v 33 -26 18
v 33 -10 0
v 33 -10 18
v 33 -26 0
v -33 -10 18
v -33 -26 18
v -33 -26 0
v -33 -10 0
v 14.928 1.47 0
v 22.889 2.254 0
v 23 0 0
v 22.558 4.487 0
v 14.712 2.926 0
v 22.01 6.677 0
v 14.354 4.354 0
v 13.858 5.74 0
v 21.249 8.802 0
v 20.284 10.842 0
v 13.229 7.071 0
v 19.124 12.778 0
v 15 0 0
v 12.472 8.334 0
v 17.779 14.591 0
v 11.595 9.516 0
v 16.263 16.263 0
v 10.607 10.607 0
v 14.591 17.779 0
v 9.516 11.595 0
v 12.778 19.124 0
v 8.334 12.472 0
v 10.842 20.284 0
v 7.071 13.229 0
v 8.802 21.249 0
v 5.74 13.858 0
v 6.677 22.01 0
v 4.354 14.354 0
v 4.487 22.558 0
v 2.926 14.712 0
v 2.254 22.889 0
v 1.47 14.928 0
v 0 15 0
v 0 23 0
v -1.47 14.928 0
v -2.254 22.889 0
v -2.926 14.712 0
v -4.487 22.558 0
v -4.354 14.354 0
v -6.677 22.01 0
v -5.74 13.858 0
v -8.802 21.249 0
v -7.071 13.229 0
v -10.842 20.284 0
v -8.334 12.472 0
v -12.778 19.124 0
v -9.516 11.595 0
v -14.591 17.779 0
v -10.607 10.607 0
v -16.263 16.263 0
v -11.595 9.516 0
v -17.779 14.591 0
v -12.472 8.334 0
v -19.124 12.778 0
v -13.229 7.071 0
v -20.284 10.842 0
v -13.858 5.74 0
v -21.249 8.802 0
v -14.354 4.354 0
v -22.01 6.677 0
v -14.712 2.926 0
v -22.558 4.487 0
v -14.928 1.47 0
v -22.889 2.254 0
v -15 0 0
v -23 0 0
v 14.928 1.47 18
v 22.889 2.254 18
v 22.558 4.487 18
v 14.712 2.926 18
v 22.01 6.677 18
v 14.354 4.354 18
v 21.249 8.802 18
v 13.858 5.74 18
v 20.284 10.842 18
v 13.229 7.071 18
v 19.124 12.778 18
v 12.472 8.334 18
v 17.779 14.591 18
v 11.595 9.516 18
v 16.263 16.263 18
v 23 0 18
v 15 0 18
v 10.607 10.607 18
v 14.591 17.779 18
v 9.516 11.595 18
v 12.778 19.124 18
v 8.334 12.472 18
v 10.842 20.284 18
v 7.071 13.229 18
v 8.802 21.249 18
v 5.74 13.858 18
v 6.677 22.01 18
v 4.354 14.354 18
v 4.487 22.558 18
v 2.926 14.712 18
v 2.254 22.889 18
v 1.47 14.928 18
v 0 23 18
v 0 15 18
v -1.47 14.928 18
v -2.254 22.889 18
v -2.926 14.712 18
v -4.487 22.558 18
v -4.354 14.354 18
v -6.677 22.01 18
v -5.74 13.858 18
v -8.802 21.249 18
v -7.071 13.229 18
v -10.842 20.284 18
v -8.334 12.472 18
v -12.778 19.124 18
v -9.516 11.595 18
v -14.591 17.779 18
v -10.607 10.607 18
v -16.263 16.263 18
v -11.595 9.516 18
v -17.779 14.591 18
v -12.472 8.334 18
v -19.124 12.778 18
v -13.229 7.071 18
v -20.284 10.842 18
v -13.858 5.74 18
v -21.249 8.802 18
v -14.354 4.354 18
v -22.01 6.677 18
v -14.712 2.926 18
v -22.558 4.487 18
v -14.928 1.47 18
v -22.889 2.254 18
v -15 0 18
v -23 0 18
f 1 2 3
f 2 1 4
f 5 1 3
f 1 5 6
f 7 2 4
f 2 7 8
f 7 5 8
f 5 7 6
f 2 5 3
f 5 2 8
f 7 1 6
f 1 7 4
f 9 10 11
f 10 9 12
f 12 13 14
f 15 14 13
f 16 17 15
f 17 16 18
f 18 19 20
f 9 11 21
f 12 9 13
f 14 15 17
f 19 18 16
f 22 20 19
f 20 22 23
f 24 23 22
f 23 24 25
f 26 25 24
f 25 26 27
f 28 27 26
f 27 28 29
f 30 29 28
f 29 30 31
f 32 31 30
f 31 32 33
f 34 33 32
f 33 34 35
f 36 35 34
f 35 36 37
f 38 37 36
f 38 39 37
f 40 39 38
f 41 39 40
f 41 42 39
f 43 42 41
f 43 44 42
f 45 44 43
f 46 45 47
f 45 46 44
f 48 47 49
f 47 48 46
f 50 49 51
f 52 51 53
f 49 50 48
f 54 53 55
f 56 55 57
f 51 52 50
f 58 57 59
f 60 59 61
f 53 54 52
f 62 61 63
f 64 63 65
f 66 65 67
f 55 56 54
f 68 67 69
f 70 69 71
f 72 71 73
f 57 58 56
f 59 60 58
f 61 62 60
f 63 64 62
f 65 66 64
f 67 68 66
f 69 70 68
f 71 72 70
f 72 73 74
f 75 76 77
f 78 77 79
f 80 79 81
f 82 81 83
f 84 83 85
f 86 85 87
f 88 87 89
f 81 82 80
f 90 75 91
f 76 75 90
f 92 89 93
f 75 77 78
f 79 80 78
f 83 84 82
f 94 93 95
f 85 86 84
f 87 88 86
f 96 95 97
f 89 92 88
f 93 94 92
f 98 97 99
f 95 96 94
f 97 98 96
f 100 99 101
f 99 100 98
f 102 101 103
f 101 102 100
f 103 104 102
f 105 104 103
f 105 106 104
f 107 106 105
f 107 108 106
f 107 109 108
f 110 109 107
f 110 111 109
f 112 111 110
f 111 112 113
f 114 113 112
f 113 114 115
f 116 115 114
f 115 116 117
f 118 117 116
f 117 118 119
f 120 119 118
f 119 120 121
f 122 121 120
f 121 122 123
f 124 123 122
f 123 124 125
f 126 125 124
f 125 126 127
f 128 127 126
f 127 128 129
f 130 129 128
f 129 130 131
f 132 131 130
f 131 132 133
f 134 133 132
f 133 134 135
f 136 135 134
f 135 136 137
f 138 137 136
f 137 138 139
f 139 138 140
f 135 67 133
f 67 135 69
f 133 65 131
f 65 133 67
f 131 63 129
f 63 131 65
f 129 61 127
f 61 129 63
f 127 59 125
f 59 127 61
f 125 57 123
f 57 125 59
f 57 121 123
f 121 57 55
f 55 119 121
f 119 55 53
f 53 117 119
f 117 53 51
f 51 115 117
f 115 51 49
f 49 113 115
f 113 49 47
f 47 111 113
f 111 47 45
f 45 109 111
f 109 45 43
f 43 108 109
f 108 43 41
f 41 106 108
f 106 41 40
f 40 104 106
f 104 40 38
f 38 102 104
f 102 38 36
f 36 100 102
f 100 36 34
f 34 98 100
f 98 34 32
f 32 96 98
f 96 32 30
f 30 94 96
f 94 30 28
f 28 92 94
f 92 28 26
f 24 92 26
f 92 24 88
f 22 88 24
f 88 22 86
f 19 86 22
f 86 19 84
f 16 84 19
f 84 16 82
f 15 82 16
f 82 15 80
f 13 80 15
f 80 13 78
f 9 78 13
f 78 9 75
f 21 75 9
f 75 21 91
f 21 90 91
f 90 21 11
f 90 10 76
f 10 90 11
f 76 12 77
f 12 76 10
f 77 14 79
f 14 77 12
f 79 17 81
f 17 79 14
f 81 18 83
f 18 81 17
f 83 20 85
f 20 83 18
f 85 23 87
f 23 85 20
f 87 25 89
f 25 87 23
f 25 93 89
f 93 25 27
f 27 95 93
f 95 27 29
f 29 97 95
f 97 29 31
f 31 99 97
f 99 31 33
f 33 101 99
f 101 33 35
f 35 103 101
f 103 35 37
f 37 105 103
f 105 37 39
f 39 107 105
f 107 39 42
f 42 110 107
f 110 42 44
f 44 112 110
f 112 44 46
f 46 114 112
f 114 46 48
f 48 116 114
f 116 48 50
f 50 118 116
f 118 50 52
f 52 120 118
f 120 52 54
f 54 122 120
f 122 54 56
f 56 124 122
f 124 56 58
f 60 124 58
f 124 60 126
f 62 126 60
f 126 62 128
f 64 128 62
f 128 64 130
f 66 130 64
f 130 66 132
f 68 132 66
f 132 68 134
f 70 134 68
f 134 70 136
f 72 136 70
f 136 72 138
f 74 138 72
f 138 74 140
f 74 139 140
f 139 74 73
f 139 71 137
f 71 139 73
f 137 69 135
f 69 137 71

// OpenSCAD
// Generated with SolidPython2 for OpenSCAD task-017
$fn = 64;

union() {
	linear_extrude(height = 18) {
		difference() {
			circle(r = 23);
			circle(r = 15);
			translate(v = [-30, -30, 0]) {
				square(size = [60, 30]);
			}
		}
	}
	translate(v = [0, -18, 0]) {
		difference() {
			translate(v = [-33.0, -8.0, 0]) {
				cube(size = [66, 16, 18]);
			}
			translate(v = [-24, -18, -1]) {
				cylinder(h = 20, r = 2.5);
			}
			translate(v = [24, -18, -1]) {
				cylinder(h = 20, r = 2.5);
			}
		}
	}
}
